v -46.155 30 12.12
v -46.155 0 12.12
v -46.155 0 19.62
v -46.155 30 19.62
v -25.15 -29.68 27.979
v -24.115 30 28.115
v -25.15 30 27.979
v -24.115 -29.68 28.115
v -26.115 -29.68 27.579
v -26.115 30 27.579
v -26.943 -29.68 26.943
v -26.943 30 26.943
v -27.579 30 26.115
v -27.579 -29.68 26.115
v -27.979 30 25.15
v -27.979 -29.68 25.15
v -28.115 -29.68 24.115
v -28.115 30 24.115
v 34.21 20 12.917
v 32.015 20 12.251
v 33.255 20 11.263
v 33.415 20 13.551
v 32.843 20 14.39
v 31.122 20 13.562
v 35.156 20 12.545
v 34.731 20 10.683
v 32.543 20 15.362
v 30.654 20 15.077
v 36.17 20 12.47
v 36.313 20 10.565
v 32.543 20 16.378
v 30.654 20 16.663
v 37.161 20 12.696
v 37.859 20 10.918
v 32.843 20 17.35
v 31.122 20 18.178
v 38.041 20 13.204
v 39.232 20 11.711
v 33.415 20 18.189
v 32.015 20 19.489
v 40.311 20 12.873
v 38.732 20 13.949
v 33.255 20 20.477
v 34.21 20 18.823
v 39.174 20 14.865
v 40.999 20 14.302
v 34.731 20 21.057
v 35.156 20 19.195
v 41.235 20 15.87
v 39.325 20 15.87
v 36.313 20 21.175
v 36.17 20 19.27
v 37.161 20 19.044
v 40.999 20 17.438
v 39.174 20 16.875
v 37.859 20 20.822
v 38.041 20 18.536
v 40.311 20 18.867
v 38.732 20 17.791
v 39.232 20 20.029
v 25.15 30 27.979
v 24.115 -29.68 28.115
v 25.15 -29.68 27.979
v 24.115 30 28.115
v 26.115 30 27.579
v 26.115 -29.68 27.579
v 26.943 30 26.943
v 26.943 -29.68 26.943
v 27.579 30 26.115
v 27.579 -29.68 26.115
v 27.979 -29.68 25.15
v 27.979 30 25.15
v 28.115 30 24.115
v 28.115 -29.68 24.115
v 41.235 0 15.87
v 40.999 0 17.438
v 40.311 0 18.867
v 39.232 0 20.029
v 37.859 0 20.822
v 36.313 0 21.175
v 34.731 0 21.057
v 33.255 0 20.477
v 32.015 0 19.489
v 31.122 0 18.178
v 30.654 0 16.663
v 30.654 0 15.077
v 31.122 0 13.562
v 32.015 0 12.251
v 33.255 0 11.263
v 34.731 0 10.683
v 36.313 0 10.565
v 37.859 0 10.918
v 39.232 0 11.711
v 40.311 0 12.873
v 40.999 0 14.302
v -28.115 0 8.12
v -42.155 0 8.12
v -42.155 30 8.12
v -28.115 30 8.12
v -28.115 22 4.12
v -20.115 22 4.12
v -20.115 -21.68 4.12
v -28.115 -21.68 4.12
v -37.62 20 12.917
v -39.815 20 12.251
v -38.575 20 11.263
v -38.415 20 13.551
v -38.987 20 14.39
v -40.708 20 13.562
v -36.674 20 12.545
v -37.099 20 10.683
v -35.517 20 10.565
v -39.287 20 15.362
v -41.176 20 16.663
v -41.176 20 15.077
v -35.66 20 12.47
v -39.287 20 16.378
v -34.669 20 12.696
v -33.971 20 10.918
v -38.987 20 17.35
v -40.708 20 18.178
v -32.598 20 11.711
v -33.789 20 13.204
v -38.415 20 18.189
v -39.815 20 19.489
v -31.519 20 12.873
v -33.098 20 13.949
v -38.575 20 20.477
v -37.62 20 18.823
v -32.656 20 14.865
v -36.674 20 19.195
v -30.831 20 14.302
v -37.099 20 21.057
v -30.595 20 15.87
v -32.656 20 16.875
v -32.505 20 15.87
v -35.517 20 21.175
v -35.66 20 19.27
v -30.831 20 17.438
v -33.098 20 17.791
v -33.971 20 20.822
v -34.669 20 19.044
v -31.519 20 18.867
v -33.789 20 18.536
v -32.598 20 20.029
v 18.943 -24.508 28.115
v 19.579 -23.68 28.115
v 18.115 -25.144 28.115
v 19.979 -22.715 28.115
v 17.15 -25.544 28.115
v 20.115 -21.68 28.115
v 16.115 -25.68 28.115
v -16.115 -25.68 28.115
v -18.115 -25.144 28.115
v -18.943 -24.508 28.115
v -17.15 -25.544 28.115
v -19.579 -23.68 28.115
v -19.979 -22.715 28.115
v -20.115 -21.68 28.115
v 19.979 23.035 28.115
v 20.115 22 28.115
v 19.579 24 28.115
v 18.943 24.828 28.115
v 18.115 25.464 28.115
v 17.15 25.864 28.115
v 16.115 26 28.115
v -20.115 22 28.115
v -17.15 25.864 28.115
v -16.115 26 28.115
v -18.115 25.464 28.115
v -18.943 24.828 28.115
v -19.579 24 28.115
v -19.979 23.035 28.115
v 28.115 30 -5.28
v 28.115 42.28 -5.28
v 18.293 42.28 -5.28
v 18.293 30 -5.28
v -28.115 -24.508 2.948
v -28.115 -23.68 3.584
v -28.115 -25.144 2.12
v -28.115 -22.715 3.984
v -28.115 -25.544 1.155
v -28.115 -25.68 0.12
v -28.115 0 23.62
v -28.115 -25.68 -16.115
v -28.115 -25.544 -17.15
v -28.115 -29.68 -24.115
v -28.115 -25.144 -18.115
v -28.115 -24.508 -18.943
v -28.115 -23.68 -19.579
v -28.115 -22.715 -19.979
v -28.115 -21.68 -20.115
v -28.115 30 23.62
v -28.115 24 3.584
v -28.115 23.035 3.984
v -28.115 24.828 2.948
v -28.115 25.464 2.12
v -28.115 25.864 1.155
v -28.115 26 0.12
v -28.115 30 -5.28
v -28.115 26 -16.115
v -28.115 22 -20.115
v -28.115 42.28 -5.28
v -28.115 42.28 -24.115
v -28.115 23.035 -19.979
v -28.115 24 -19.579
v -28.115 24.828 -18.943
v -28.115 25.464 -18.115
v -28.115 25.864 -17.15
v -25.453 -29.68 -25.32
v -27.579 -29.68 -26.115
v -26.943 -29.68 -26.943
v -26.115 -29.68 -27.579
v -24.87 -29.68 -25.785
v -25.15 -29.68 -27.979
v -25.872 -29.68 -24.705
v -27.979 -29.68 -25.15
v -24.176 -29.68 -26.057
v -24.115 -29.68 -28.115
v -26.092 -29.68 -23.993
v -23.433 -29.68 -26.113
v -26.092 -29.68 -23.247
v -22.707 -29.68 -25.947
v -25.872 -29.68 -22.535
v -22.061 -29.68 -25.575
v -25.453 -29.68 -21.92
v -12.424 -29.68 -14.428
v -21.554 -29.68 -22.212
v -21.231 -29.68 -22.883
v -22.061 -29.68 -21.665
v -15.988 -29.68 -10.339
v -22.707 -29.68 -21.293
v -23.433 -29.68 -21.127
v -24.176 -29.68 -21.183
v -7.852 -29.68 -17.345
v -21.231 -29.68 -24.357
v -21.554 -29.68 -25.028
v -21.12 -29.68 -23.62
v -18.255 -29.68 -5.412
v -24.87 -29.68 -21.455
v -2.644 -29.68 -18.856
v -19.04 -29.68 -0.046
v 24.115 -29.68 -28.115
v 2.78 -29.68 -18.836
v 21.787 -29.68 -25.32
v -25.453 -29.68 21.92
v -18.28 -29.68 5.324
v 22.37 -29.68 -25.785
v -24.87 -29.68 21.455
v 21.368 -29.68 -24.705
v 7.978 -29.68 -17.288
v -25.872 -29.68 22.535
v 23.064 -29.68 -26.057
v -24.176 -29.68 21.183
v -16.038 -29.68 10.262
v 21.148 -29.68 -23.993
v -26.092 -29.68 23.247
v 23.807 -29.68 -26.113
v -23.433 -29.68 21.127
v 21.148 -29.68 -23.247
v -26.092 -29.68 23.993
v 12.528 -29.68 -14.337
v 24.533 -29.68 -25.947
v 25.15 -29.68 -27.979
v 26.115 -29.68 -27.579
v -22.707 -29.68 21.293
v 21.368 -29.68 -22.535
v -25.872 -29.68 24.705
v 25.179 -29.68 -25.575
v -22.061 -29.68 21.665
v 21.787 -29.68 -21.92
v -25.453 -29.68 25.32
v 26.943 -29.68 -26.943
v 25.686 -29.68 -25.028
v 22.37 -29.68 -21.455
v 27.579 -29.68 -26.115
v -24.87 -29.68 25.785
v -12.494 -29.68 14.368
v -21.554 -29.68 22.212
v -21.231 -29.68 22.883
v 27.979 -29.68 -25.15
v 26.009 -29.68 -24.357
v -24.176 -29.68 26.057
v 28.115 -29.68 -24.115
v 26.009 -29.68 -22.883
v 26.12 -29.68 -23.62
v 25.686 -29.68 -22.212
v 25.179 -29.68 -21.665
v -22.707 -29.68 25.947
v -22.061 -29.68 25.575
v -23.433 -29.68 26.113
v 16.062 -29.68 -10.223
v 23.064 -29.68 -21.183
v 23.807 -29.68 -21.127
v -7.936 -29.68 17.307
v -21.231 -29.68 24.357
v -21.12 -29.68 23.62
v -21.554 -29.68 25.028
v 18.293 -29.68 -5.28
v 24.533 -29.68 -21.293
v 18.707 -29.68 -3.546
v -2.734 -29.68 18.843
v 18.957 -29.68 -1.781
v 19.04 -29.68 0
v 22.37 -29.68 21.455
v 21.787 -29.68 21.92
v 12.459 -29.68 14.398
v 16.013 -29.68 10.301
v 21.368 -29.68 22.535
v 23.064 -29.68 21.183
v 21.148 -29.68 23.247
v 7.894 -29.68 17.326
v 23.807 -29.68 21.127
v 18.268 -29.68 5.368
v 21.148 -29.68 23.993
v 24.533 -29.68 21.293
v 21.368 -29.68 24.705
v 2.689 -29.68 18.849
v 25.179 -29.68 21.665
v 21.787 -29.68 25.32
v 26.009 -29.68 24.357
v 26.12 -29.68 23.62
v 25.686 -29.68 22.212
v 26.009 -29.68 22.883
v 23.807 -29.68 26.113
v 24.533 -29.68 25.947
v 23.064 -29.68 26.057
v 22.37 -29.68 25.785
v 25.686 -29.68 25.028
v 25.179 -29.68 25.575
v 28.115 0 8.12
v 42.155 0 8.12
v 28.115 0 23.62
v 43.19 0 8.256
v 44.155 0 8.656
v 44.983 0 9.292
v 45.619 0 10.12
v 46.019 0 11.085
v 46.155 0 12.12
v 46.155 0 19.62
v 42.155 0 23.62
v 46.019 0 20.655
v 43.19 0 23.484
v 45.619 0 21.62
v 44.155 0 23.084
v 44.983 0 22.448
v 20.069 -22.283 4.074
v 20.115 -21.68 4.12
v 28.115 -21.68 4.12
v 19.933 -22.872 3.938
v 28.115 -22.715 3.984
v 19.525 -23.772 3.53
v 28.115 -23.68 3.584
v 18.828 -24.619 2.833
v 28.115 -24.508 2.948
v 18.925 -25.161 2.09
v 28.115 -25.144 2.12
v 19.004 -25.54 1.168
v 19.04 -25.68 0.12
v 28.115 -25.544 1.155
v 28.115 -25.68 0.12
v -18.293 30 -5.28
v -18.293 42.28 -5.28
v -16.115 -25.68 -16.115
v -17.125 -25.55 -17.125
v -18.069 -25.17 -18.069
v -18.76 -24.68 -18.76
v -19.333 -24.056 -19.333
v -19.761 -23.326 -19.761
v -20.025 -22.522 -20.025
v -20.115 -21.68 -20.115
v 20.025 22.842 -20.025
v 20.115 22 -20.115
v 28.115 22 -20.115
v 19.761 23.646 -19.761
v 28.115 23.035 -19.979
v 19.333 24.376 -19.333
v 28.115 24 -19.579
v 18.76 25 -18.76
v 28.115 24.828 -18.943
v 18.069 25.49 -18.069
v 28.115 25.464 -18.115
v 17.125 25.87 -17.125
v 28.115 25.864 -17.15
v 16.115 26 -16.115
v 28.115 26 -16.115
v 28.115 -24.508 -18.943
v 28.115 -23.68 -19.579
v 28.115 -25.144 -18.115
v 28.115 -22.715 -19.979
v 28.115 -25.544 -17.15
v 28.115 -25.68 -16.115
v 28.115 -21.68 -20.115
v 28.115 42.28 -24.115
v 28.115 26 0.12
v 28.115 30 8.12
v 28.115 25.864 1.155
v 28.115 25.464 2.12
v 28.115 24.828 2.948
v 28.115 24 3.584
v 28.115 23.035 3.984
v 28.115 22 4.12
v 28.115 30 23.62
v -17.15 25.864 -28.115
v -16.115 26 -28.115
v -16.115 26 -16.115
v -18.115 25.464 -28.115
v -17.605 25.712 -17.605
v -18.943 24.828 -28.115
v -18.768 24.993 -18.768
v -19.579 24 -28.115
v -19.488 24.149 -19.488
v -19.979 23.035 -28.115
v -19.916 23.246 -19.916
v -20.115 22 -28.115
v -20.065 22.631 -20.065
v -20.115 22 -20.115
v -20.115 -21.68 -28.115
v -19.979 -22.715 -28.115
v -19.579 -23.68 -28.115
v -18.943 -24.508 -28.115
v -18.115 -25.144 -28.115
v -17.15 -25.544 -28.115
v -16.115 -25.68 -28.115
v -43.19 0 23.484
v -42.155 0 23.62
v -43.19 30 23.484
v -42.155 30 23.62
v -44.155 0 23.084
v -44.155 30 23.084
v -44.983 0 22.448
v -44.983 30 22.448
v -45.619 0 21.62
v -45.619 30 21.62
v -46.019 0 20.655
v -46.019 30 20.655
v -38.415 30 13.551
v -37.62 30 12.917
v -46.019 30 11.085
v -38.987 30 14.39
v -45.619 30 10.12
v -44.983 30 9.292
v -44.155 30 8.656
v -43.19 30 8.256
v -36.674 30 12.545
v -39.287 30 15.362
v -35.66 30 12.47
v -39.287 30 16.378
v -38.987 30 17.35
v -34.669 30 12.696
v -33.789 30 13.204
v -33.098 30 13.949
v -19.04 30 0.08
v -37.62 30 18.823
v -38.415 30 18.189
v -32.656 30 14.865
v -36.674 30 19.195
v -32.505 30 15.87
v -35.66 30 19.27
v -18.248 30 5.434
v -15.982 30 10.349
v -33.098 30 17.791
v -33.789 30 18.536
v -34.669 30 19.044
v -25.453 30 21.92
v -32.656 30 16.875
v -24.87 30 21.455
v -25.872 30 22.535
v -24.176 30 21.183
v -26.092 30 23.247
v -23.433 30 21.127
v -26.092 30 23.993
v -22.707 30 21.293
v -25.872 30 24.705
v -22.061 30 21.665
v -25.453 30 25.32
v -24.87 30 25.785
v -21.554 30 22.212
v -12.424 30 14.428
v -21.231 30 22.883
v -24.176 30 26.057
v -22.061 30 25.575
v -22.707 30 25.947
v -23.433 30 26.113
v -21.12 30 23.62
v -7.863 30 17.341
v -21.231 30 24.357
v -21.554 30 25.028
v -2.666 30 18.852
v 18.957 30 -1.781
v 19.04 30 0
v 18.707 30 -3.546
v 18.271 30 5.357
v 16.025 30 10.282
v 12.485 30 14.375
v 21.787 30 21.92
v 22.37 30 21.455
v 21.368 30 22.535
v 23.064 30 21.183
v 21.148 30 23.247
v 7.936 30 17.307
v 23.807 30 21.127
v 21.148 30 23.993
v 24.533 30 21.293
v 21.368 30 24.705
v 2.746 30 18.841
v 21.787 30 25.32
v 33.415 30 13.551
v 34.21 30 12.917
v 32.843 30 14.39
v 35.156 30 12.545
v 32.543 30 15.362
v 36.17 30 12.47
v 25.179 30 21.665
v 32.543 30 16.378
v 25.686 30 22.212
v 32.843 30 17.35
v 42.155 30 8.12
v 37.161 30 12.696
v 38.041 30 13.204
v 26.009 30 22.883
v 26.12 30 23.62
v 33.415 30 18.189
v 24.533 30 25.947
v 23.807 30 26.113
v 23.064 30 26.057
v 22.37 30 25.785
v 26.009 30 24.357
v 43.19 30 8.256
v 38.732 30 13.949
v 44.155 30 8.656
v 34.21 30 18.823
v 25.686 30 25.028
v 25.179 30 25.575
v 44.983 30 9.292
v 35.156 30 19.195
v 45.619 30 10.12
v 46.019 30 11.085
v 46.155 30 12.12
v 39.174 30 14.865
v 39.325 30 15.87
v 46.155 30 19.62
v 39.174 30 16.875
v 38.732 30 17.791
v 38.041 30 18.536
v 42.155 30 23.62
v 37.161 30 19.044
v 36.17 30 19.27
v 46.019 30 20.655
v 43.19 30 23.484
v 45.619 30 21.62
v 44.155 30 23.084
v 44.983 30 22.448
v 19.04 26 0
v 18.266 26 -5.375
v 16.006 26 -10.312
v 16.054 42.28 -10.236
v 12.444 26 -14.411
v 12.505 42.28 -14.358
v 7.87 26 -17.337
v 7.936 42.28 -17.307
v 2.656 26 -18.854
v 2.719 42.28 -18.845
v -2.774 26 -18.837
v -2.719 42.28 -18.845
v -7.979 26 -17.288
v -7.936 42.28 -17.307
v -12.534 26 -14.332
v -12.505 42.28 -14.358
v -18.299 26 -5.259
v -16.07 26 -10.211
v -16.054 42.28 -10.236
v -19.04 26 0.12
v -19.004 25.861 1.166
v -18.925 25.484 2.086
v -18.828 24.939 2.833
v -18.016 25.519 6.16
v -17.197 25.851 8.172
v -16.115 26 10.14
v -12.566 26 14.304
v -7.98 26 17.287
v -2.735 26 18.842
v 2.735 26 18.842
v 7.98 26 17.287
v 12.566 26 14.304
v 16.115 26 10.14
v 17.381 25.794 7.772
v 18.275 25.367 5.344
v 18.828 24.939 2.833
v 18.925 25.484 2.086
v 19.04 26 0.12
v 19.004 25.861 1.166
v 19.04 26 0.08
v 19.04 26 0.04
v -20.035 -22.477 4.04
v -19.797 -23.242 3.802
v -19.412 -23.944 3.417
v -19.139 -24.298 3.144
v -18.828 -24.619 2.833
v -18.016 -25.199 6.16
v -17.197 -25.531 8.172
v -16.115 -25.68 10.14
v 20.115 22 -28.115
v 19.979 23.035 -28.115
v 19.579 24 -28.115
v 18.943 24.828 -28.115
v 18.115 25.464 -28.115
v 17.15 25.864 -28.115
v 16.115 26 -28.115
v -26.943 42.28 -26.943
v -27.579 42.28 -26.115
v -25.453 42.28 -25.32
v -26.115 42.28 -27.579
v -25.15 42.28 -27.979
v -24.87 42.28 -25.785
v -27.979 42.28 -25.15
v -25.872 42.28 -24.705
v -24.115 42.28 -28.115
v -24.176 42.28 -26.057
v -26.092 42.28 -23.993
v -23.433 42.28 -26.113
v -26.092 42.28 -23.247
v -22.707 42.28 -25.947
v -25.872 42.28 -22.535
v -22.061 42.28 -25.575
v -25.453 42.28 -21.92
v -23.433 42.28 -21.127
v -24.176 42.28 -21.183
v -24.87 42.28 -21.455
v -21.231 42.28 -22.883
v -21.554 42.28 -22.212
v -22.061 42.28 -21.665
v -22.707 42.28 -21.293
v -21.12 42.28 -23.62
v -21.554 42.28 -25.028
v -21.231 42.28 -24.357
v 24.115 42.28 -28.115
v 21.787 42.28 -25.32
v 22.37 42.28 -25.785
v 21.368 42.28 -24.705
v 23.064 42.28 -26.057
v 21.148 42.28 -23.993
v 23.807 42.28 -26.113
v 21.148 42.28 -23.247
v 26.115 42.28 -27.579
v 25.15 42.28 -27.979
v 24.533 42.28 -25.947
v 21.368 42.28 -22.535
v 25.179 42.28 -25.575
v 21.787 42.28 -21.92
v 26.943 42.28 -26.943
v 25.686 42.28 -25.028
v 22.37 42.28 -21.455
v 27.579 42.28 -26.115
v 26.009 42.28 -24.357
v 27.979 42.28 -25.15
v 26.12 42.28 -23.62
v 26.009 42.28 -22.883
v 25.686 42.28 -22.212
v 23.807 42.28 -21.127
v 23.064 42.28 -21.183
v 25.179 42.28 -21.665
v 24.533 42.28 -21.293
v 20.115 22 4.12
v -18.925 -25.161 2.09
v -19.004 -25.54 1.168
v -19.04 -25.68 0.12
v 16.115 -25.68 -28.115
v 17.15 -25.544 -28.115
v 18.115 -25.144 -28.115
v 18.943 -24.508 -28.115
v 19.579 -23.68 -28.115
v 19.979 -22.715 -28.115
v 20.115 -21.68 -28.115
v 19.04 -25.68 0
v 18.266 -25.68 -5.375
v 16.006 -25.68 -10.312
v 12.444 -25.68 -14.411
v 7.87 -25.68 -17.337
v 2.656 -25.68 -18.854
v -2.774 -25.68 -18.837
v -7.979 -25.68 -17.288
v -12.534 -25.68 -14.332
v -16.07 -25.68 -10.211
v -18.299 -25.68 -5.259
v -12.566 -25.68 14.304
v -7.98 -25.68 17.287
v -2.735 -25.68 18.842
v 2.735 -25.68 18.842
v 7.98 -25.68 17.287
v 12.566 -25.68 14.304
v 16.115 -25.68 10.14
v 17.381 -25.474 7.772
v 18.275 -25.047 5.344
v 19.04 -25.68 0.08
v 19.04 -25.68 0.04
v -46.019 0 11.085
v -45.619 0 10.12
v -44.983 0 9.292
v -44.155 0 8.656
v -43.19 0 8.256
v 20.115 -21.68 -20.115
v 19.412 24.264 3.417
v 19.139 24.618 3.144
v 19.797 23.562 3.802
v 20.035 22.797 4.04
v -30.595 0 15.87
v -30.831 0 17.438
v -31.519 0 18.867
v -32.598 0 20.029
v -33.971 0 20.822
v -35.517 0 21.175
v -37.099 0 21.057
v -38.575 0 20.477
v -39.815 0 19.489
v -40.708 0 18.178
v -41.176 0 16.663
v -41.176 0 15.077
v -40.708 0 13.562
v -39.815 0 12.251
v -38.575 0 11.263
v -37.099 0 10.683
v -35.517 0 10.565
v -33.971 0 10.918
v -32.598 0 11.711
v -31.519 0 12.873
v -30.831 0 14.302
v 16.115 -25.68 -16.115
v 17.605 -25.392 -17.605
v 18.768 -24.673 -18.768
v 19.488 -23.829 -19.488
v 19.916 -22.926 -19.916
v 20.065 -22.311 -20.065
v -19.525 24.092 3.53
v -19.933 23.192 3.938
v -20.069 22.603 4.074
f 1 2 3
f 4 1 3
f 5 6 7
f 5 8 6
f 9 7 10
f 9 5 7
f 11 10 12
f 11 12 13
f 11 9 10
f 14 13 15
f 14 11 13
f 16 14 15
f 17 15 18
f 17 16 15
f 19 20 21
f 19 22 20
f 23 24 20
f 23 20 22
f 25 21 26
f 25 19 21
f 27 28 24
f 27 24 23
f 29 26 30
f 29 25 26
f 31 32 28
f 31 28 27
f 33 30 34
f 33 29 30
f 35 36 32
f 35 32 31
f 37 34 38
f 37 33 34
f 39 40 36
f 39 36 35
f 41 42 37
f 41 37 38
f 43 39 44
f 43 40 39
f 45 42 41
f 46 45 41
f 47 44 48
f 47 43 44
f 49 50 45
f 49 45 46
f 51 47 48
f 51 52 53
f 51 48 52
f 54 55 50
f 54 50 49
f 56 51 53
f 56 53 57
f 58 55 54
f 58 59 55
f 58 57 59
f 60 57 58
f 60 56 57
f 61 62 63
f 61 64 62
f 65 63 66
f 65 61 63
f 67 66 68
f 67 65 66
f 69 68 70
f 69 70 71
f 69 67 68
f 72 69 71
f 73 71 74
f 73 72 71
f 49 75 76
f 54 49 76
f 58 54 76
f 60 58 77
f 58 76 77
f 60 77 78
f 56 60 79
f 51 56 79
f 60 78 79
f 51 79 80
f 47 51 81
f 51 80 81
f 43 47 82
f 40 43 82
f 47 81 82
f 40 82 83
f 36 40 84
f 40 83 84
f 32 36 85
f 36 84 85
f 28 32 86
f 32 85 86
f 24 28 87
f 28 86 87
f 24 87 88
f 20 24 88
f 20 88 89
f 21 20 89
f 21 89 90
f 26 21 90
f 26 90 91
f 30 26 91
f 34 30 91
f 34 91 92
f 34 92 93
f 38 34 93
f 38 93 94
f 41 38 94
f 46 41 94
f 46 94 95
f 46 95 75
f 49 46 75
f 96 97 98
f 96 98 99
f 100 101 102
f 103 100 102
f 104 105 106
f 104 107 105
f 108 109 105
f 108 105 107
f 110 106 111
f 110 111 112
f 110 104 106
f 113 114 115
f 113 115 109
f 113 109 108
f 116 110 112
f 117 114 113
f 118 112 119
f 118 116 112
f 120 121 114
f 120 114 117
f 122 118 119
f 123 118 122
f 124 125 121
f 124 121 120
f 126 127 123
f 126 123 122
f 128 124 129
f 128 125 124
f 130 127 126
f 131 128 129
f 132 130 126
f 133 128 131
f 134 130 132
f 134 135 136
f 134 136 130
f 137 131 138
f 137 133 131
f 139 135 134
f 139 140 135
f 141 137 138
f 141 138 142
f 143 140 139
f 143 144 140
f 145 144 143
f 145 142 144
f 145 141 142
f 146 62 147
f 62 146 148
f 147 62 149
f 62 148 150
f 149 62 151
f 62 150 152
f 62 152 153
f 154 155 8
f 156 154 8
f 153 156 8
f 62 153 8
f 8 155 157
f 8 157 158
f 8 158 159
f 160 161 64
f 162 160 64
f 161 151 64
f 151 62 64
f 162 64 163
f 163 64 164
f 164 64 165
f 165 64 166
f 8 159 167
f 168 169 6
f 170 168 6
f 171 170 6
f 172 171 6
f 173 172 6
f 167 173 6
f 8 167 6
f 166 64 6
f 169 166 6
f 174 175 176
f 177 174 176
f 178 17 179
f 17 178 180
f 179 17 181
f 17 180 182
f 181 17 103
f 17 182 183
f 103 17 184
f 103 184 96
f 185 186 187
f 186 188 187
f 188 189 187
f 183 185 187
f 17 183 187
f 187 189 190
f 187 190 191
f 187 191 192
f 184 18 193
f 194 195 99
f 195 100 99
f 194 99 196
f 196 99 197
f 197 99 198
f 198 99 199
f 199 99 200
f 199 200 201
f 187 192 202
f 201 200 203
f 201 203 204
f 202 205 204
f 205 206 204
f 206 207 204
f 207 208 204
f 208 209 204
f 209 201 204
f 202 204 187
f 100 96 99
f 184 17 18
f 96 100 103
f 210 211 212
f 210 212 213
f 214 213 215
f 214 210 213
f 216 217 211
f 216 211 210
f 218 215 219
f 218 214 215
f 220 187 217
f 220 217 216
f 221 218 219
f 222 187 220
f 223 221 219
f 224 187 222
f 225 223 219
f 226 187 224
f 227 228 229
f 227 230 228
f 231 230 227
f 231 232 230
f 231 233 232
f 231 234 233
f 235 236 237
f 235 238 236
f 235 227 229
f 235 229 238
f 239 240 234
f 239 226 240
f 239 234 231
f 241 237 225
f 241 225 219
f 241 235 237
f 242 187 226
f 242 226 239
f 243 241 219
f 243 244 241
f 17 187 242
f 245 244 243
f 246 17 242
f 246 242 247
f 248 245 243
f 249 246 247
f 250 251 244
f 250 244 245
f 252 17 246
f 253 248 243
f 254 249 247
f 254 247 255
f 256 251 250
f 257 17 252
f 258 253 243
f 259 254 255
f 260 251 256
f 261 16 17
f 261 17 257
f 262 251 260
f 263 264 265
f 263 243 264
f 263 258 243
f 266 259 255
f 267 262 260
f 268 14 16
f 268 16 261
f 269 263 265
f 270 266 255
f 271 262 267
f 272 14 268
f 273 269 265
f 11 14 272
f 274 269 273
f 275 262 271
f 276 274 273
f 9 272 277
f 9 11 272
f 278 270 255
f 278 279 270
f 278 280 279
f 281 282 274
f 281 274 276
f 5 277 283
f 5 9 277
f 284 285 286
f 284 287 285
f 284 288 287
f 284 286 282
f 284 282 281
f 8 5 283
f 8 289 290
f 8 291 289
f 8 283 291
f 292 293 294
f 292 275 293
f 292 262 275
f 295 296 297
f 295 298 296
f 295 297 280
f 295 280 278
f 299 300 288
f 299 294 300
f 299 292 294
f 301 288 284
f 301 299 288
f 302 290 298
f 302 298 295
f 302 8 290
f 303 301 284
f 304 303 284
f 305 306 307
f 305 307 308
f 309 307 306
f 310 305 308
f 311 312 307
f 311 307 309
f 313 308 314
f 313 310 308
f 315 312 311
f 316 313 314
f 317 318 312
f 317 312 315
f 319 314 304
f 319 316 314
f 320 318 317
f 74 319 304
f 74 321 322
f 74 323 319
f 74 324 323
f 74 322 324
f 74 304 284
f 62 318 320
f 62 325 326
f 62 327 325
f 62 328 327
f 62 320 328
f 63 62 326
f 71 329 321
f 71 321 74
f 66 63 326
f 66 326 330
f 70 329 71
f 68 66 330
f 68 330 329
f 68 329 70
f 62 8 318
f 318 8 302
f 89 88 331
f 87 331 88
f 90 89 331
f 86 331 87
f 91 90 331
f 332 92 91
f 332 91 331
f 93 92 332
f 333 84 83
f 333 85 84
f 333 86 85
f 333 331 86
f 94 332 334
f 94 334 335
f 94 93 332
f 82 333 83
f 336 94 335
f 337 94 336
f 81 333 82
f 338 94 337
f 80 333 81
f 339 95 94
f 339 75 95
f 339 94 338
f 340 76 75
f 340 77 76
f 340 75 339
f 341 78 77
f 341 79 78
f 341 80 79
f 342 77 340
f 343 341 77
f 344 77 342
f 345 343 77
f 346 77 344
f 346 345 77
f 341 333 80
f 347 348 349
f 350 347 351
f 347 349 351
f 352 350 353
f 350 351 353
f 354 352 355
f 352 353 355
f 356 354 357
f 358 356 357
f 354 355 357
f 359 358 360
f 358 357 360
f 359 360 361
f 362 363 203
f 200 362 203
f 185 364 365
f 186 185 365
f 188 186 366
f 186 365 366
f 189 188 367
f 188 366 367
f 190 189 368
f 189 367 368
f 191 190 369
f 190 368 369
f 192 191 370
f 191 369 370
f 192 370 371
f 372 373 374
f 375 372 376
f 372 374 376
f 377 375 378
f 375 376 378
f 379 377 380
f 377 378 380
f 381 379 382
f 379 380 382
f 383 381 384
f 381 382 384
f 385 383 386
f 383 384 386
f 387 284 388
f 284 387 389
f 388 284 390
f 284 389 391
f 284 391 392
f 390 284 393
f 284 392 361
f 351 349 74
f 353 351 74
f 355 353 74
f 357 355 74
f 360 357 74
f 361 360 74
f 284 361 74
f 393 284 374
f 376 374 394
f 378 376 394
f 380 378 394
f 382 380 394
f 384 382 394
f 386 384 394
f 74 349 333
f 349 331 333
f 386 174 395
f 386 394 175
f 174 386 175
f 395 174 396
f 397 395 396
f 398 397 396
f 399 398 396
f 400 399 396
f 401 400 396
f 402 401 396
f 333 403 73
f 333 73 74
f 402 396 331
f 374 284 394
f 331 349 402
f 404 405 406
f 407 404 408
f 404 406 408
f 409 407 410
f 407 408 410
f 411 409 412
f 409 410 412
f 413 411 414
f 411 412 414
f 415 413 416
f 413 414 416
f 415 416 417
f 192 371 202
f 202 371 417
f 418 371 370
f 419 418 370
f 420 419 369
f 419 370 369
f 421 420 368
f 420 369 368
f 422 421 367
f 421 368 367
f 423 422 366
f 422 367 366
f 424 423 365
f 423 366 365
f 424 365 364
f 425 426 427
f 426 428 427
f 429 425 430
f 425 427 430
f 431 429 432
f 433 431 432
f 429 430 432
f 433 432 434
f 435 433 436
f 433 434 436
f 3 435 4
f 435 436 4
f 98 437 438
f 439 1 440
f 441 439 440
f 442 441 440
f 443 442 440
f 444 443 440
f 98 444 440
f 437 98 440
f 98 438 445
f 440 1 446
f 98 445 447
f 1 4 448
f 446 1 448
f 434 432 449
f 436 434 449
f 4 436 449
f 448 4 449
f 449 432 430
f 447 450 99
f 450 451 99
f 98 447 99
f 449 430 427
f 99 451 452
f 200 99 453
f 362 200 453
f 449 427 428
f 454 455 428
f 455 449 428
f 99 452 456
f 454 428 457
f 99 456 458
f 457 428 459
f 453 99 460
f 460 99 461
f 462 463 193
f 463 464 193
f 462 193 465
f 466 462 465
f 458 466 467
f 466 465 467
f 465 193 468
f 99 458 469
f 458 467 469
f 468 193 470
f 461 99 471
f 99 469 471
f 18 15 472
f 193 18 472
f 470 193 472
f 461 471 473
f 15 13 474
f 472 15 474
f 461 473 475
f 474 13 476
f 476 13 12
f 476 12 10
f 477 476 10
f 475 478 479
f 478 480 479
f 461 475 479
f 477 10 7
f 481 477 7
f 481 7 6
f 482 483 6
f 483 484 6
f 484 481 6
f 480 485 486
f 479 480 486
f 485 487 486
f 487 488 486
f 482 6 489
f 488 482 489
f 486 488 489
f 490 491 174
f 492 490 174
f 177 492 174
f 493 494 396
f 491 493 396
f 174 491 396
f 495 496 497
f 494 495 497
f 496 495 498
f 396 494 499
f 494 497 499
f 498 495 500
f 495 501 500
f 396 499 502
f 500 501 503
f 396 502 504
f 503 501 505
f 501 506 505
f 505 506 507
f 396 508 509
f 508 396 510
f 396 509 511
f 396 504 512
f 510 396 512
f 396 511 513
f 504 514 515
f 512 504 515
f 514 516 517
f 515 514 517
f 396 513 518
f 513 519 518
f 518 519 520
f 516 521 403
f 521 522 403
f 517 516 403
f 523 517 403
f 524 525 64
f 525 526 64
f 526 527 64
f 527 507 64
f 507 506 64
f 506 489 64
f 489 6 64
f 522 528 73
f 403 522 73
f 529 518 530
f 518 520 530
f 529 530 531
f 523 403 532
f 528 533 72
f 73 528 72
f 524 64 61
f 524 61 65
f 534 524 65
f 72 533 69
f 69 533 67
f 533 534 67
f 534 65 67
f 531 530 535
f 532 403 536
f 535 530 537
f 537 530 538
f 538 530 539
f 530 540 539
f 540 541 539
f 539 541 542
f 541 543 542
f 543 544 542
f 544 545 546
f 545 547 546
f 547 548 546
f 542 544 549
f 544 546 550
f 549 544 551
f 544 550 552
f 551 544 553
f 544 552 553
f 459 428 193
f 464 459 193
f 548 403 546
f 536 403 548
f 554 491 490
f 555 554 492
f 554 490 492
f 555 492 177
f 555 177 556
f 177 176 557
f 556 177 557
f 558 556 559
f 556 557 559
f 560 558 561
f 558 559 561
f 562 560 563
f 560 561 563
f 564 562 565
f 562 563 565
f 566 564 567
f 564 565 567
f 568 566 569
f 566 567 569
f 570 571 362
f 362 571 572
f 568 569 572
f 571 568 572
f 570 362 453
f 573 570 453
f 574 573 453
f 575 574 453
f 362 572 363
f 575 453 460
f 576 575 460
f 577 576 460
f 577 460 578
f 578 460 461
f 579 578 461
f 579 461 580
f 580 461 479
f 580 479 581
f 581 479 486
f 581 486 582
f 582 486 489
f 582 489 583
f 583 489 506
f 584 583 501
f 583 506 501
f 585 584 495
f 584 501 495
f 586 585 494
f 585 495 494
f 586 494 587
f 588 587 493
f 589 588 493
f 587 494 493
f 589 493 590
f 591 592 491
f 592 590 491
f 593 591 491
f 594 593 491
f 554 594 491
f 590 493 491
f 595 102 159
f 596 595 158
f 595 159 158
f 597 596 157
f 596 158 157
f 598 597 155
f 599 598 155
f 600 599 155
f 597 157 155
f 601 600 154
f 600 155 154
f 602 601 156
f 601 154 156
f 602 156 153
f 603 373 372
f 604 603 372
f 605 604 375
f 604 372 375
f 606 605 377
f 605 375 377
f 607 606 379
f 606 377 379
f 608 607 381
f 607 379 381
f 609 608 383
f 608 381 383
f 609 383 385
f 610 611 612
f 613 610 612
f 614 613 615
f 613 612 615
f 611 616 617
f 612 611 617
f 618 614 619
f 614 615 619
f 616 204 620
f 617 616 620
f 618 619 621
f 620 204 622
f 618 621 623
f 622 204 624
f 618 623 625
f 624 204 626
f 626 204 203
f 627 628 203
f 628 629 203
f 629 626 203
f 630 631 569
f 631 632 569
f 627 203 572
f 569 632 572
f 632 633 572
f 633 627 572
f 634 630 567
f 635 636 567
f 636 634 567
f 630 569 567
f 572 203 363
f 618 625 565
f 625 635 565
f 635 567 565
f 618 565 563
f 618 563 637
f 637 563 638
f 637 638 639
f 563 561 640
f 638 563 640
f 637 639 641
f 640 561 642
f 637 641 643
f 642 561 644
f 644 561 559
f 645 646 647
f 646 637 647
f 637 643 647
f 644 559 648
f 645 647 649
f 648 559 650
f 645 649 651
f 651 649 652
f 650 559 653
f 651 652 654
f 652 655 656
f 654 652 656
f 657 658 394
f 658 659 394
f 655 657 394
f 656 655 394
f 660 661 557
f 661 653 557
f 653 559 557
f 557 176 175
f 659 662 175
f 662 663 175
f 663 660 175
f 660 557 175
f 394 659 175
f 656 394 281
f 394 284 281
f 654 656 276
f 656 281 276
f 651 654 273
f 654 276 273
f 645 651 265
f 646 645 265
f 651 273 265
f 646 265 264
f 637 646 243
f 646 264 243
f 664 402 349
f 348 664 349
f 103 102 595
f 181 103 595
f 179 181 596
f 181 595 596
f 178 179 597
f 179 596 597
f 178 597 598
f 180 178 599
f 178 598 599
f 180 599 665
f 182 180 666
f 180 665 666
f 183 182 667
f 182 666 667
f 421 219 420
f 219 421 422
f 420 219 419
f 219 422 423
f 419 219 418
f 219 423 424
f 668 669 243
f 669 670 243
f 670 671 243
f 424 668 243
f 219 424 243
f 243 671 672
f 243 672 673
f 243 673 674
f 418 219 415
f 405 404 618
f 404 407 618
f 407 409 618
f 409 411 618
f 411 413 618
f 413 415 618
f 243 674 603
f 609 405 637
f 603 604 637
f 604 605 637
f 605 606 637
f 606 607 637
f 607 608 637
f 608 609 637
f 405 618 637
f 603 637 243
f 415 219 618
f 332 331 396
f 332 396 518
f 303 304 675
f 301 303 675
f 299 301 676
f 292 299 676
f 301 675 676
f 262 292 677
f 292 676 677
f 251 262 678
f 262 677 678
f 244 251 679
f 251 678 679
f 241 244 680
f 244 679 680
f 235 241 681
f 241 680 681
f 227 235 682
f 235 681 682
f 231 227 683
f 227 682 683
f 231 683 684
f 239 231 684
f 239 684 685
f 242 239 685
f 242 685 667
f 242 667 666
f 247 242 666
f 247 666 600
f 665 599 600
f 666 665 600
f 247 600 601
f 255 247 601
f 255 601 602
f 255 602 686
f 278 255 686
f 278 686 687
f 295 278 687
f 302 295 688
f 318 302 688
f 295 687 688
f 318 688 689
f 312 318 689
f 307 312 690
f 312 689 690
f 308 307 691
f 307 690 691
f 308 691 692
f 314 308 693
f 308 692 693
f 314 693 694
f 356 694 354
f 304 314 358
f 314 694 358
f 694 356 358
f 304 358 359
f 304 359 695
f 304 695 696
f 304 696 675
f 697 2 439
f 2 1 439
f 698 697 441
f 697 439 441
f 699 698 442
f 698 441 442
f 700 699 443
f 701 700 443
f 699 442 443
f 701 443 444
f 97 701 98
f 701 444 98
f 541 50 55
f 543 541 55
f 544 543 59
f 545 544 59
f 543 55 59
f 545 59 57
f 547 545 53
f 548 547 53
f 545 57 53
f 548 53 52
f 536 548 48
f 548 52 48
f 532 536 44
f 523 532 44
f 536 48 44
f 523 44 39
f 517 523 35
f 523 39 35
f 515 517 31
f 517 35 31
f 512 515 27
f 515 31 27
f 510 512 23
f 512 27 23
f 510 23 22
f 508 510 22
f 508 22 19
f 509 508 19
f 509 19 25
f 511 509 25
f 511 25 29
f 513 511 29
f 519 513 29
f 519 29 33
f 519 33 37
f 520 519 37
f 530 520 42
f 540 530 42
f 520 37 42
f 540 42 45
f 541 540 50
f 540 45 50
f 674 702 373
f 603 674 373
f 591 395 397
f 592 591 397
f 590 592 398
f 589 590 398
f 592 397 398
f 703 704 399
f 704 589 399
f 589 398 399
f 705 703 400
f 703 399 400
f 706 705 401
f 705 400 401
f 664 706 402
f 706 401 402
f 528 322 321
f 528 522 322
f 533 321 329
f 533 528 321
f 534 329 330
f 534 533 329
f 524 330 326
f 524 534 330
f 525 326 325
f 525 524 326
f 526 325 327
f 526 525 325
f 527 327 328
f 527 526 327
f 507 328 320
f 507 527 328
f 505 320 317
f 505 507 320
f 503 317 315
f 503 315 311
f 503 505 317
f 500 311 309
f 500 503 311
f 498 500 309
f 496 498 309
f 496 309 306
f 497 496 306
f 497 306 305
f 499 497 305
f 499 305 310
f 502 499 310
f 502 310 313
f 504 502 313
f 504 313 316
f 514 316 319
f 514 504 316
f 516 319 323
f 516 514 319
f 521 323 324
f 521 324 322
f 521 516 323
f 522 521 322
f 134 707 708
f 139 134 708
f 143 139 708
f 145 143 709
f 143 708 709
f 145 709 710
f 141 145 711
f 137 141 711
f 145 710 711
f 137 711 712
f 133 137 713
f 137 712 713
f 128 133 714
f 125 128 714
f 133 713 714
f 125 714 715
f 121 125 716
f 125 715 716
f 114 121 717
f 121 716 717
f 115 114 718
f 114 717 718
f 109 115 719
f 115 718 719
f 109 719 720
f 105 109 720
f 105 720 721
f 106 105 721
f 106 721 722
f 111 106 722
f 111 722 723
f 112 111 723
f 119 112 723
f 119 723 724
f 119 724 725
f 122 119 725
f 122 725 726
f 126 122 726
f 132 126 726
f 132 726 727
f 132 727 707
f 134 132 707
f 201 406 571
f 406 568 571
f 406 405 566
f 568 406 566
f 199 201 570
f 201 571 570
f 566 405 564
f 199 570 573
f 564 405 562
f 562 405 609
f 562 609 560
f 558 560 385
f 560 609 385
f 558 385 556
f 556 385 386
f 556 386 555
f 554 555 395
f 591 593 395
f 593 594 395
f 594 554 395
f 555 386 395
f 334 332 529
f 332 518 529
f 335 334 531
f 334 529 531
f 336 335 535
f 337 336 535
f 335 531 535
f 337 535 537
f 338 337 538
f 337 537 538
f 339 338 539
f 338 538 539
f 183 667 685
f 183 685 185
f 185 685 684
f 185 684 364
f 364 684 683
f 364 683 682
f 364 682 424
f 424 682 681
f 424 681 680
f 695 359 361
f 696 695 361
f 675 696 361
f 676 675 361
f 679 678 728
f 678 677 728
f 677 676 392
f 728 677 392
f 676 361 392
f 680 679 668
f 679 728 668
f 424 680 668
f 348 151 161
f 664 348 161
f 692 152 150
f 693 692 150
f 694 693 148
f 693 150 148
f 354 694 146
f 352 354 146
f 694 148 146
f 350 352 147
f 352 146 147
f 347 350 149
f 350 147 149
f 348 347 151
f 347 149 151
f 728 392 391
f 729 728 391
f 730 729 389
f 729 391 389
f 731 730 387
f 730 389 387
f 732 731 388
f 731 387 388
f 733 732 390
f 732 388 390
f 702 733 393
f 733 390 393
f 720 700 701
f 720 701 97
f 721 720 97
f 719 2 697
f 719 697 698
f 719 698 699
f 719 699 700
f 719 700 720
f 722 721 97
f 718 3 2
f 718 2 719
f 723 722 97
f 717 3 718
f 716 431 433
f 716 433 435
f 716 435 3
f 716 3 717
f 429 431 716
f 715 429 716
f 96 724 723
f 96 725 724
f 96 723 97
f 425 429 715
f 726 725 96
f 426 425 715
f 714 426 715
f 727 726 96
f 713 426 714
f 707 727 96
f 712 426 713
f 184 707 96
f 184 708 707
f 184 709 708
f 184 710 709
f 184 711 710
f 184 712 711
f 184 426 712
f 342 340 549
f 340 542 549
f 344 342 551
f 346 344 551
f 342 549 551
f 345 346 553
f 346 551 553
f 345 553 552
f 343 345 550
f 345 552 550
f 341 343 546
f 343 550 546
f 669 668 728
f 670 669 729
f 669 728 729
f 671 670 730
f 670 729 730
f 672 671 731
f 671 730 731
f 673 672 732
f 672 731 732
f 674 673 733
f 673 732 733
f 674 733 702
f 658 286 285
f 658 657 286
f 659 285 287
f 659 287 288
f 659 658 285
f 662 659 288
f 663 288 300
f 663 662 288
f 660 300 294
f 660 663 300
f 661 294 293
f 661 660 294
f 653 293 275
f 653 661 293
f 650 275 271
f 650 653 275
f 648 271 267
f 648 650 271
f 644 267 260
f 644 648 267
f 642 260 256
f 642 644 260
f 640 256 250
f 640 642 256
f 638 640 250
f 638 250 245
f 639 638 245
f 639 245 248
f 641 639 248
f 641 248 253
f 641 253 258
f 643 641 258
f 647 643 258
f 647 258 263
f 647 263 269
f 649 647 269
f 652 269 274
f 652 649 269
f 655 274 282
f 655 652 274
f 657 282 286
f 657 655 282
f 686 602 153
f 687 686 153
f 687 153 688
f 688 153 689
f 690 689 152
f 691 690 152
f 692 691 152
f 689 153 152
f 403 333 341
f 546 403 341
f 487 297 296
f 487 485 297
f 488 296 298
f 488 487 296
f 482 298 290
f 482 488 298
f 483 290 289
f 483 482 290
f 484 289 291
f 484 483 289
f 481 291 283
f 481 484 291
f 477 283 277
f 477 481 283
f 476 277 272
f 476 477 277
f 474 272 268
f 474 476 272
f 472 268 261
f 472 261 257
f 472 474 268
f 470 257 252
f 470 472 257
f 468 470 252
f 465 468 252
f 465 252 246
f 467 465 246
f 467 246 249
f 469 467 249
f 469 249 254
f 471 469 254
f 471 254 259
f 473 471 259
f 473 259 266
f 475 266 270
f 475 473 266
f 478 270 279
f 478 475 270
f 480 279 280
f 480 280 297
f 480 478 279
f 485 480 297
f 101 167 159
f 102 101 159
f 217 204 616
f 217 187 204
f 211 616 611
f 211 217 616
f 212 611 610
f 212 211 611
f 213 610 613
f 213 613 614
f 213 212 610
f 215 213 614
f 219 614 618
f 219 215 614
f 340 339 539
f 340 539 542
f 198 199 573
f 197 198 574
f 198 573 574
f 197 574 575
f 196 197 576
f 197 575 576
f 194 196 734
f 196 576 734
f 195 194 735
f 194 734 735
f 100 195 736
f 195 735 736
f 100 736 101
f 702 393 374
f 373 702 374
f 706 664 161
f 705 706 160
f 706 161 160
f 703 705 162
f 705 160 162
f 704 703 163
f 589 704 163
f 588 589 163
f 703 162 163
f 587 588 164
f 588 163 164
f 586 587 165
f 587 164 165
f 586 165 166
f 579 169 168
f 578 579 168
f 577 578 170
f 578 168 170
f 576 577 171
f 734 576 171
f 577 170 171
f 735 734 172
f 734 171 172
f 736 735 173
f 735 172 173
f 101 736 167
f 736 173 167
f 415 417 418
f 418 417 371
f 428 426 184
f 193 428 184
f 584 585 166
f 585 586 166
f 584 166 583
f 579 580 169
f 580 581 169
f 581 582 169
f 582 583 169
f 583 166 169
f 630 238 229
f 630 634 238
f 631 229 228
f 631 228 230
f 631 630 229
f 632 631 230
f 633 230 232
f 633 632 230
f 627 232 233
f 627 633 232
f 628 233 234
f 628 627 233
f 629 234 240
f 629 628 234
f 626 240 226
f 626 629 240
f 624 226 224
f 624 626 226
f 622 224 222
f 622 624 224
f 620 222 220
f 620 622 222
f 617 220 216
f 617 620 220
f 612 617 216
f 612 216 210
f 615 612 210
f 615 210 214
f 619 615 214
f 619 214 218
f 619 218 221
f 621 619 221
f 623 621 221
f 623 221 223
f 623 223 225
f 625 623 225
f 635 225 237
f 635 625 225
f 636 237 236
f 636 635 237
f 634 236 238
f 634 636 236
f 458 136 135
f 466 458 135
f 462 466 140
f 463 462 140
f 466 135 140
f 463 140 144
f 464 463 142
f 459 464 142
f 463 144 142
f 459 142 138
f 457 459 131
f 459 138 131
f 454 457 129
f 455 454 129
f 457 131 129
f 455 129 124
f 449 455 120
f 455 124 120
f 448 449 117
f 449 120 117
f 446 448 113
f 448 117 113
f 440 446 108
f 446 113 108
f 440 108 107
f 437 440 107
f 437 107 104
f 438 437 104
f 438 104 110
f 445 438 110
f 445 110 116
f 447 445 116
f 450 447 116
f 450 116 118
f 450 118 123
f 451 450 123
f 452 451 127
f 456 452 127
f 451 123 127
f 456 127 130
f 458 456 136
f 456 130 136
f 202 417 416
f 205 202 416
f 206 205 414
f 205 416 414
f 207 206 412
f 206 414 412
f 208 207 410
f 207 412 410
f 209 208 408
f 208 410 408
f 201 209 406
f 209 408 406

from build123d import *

# Parameters (mm, degrees)
F3_R          = 2.5
F4_DEPTH      = 42.28
F4_DEPTH_BACK = 29.68
F5_DEPTH      = 30
F5_DEPTH_BACK = 29.68
F3_W          = 18.04
F3_H          = 15.5
F3_R_2        = 5.32
F8_DEPTH      = 30
F9_START      = -20
F1_R          = 5.32
F1_R_2        = 3.41
F9_DEPTH      = 10
F10_R         = 4
F12_DEPTH     = 56.231
F14_DEPTH     = 74.271


# Not quite as in the source:
# - a feature of the source that left no trace in its solid (it failed there, or was rolled back) is left out


with BuildPart() as f4:
    # F3 (on Front) → F4 (new body, two sides)
    with BuildSketch(Plane.XZ) as f4_sk:
        with BuildLine():
            Line((-18.2932555878, -5.28), (-28.115, -5.28))
            Line((-28.115, -5.28), (-28.115, -28.115))
            Line((-28.115, -28.115), (28.115, -28.115))
            Line((28.115, -28.115), (28.115, -5.28))
            Line((28.115, -5.28), (18.2932555878, -5.28))
            ThreePointArc((18.2932555878, -5.28), (0, -19.04), (-18.2932555878, -5.28))
        make_face()
        with Locations((-23.62, -23.62)):
            Circle(F3_R, mode=Mode.SUBTRACT)
        with Locations((23.62, -23.62)):
            Circle(F3_R, mode=Mode.SUBTRACT)
    extrude(amount=-F4_DEPTH)
    extrude(f4_sk.sketch, amount=F4_DEPTH_BACK)

    # F3 (on Front) → F5 (join, two sides)
    with BuildSketch(Plane.XZ) as f5_sk:
        with BuildLine():
            Line((28.115, 28.115), (-28.115, 28.115))
            Line((-28.115, 28.115), (-28.115, 23.62))
            Line((-28.115, 23.62), (-28.115, 8.12))
            Line((-28.115, 8.12), (-28.115, -5.28))
            Line((-28.115, -5.28), (-18.2932555878, -5.28))
            ThreePointArc((-18.2932555878, -5.28), (-2.6662720799, 18.8523895885), (19.04, 0))
            ThreePointArc((19.04, 0), (18.8523895885, -2.6662720799), (18.2932555878, -5.28))
            Line((18.2932555878, -5.28), (28.115, -5.28))
            Line((28.115, -5.28), (28.115, 8.12))
            Line((28.115, 8.12), (28.115, 23.62))
            Line((28.115, 23.62), (28.115, 28.115))
        make_face()
        with Locations((-23.62, 23.62)):
            Circle(F3_R, mode=Mode.SUBTRACT)
        with Locations((23.62, 23.62)):
            Circle(F3_R, mode=Mode.SUBTRACT)
    extrude(amount=-F5_DEPTH)
    extrude(f5_sk.sketch, amount=F5_DEPTH_BACK)

    # F3 (on Front) → F8 (join)
    with BuildSketch(Plane.XZ):
        with Locations((37.135, 15.87)):
            Rectangle(F3_W, F3_H)
        with Locations((35.915, 15.87)):
            Circle(F3_R_2, mode=Mode.SUBTRACT)
        with Locations((-37.135, 15.87)):
            Rectangle(F3_W, F3_H)
        with Locations((-35.915, 15.87)):
            Circle(F3_R_2, mode=Mode.SUBTRACT)
    extrude(amount=-F8_DEPTH)

    # F1 (on Front) → F9 (join)
    with BuildSketch(Plane.XZ.offset(F9_START)):
        with Locations((35.915, 15.87)):
            Circle(F1_R)
        with Locations((35.915, 15.87)):
            Circle(F1_R_2, mode=Mode.SUBTRACT)
        with Locations((-35.915, 15.87)):
            Circle(F1_R)
        with Locations((-35.915, 15.87)):
            Circle(F1_R_2, mode=Mode.SUBTRACT)
    extrude(amount=-F9_DEPTH)

    # F10
    f10_edges = [f4.edges().sort_by_distance(p)[0] for p in [
        (-46.155, 15, 23.62),
        (-46.155, 15, 8.12),
        (-28.115, 6.3, -28.115),
        (28.115, 6.3, -28.115),
        (46.155, 15, 8.12),
        (46.155, 15, 23.62),
        (28.115, 0.16, 28.115),
        (-28.115, 0.16, 28.115),
    ]]
    fillet(f10_edges, radius=F10_R)

    # F11 (on face) → F12 (cut, through all)
    with BuildSketch(Plane.XY.offset(28.115)):
        with BuildLine():
            Line((16.115, 26), (-16.115, 26))
            ThreePointArc((-16.115, 26), (-18.9434271247, 24.8284271247), (-20.115, 22))
            Line((-20.115, 22), (-20.115, -21.68))
            ThreePointArc((-20.115, -21.68), (-18.9434271247, -24.5084271247), (-16.115, -25.68))
            Line((-16.115, -25.68), (16.115, -25.68))
            ThreePointArc((16.115, -25.68), (18.9434271247, -24.5084271247), (20.115, -21.68))
            Line((20.115, -21.68), (20.115, 22))
            ThreePointArc((20.115, 22), (18.9434271247, 24.8284271247), (16.115, 26))
        make_face()
    extrude(amount=-F12_DEPTH, mode=Mode.SUBTRACT)

    # F13 (on face) → F14 (cut, through all)
    with BuildSketch(Plane.YZ.offset(28.115)):
        with BuildLine():
            Line((22, 4.12), (-21.68, 4.12))
            ThreePointArc((-21.68, 4.12), (-24.5084271247, 2.9484271247), (-25.68, 0.12))
            Line((-25.68, 0.12), (-25.68, -16.115))
            ThreePointArc((-25.68, -16.115), (-24.5084271247, -18.9434271247), (-21.68, -20.115))
            Line((-21.68, -20.115), (22, -20.115))
            ThreePointArc((22, -20.115), (24.8284271247, -18.9434271247), (26, -16.115))
            Line((26, -16.115), (26, 0.12))
            ThreePointArc((26, 0.12), (24.8284271247, 2.9484271247), (22, 4.12))
        make_face()
    extrude(amount=-F14_DEPTH, mode=Mode.SUBTRACT)


solid = f4.part
